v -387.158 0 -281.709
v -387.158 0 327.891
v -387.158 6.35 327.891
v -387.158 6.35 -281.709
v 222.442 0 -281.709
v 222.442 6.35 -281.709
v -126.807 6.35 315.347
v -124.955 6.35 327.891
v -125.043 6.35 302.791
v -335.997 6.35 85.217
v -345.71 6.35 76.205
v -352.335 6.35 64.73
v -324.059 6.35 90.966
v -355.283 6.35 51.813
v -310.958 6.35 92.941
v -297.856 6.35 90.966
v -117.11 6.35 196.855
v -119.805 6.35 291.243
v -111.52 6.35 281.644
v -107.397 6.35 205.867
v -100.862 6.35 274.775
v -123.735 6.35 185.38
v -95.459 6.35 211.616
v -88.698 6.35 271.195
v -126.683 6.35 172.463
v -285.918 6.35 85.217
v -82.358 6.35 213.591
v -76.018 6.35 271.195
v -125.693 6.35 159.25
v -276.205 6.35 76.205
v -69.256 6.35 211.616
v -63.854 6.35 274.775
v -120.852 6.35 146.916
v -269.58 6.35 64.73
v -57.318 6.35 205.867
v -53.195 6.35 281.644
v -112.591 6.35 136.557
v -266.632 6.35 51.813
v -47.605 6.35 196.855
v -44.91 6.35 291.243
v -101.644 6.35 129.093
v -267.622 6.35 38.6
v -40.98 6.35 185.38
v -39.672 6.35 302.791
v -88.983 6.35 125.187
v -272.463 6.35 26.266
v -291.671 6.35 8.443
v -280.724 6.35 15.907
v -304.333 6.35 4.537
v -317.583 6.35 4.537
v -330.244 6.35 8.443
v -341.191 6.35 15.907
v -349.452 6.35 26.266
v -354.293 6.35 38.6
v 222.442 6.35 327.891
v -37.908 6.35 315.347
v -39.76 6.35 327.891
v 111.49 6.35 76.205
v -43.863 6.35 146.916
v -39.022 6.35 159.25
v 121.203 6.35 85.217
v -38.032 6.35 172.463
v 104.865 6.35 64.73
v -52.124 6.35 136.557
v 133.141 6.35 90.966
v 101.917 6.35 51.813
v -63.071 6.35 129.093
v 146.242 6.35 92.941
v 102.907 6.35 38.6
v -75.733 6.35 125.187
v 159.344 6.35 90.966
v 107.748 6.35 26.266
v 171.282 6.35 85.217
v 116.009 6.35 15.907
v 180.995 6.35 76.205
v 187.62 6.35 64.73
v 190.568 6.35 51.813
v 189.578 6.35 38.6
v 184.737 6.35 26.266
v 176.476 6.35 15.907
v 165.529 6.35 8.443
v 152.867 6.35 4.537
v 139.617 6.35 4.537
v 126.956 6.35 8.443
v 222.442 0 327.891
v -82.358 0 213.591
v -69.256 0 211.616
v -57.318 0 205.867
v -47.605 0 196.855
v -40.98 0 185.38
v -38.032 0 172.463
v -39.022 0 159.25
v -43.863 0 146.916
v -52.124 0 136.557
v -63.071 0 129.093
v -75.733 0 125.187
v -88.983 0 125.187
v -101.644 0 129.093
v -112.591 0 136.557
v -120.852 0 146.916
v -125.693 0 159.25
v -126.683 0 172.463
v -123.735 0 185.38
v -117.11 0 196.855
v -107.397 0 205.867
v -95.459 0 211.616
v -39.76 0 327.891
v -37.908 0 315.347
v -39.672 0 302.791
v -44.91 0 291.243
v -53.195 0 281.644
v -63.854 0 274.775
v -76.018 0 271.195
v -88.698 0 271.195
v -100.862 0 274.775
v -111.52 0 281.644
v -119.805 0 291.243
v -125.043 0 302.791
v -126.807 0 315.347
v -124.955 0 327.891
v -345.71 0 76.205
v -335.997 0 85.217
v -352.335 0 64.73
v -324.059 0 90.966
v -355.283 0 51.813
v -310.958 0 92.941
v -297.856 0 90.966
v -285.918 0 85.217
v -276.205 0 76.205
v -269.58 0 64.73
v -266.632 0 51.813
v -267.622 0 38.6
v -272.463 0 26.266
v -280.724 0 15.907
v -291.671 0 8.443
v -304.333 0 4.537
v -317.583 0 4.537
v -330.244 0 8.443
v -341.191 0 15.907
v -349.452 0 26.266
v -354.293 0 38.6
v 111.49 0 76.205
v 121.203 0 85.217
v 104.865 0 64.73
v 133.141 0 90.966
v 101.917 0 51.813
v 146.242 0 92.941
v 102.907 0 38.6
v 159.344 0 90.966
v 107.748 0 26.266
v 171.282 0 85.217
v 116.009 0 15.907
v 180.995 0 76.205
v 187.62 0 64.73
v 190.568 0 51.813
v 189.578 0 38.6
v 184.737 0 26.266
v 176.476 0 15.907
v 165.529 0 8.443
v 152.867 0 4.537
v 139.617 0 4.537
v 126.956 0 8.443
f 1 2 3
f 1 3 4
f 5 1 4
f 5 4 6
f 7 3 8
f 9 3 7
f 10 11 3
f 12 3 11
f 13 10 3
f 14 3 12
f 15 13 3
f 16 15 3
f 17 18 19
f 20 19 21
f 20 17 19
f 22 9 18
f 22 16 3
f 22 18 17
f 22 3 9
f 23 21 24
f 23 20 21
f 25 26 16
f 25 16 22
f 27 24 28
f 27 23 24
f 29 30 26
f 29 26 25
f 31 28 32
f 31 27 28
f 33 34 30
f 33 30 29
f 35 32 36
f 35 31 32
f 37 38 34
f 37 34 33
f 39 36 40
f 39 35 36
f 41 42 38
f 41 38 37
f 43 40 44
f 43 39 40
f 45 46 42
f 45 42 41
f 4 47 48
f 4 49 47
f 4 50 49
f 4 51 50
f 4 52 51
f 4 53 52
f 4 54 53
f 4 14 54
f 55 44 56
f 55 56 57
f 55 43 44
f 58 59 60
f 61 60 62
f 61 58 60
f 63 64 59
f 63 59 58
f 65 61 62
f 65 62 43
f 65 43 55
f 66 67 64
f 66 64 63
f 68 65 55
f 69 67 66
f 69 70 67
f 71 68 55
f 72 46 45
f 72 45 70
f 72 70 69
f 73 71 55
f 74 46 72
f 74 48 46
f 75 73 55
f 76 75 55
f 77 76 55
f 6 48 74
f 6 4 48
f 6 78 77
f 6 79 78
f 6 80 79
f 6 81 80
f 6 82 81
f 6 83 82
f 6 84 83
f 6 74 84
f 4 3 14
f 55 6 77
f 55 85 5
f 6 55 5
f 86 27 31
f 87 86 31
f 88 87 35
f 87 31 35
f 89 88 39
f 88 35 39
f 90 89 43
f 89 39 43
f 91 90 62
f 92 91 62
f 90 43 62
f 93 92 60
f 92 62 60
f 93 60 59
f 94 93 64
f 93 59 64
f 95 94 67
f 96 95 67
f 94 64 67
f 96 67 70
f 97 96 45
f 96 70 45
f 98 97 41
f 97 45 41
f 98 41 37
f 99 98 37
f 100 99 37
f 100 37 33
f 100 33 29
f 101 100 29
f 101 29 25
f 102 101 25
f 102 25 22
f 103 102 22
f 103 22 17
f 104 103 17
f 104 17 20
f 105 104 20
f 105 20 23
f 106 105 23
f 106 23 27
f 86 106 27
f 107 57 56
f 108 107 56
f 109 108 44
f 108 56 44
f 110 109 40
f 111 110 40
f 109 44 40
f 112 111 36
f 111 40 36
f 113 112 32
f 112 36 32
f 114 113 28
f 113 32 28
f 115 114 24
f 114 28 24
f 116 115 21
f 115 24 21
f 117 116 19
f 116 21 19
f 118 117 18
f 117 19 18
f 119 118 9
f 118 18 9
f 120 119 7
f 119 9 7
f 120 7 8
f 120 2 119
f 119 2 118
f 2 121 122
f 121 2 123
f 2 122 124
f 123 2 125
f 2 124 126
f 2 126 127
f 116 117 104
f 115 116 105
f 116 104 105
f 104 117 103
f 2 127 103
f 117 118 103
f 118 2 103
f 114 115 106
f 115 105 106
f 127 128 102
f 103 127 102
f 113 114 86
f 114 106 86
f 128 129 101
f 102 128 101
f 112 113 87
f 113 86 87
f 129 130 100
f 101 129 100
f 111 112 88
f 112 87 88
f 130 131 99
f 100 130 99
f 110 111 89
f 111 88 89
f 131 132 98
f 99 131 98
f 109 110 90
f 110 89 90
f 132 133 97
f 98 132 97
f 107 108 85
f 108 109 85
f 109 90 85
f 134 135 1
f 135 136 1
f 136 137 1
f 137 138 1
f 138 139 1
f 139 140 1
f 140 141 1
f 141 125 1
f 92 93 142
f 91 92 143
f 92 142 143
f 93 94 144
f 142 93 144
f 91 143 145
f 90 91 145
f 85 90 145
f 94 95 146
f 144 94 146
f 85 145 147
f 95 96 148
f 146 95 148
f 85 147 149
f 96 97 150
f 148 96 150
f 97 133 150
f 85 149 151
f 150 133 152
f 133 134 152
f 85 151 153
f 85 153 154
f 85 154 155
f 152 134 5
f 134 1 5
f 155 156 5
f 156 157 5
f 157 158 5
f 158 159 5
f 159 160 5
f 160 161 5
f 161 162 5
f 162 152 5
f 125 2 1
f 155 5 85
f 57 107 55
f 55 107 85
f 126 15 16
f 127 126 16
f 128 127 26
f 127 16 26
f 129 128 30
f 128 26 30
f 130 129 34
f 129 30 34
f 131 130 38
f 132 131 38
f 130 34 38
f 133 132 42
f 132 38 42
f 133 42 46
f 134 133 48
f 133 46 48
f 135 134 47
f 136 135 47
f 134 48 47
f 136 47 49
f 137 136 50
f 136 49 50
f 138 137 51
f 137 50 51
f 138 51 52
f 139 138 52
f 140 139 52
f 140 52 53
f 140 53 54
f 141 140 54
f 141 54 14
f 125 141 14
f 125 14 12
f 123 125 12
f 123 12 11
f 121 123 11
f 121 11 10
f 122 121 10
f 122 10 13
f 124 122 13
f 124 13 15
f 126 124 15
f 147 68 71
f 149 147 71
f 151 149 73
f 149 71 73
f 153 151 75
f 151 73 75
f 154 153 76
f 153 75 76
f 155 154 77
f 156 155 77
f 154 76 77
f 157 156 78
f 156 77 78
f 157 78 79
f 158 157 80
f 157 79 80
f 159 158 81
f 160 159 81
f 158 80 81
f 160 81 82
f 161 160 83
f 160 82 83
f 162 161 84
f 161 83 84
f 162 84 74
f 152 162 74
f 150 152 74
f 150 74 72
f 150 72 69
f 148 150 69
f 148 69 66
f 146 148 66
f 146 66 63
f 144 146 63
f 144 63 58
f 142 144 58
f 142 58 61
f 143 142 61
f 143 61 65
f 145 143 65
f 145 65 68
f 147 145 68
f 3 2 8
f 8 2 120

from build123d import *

# Parameters (mm, degrees)
SKETCH1_W           = 609.6
SKETCH1_H           = 609.6
BOSS_EXTRUDE1_DEPTH = 6.35
SKETCH2_R           = 44.45
CUT_EXTRUDE1_DEPTH  = 101.6


with BuildPart() as part:
    # Sketch1 → Boss-Extrude1 (new body)
    with BuildSketch(Plane(origin=(0, 0, 0), x_dir=(1, 0, 0), z_dir=(0, 1, 0))):
        with Locations((-82.357575758, -23.090909091)):
            Rectangle(SKETCH1_W, SKETCH1_H)
    extrude(amount=BOSS_EXTRUDE1_DEPTH)

    # Sketch2 → Cut-Extrude1 (cut)
    with BuildSketch(Plane(origin=(0, 6.35, 0), x_dir=(1, 0, 0), z_dir=(0, 1, 0))):
        with Locations(Location((-82.357575758, -169.140909091, 0), (0, 0, 270))):
            Circle(SKETCH2_R)
        with Locations((-82.357575758, -315.190909091)):
            Circle(SKETCH2_R)
        with Locations(Location((-310.957575758, -48.490909091, 0), (0, 0, 270))):
            Circle(SKETCH2_R)
        with Locations(Location((146.242424242, -48.490909091, 0), (0, 0, 270))):
            Circle(SKETCH2_R)
    extrude(amount=-CUT_EXTRUDE1_DEPTH, mode=Mode.SUBTRACT)


solid = part.part
